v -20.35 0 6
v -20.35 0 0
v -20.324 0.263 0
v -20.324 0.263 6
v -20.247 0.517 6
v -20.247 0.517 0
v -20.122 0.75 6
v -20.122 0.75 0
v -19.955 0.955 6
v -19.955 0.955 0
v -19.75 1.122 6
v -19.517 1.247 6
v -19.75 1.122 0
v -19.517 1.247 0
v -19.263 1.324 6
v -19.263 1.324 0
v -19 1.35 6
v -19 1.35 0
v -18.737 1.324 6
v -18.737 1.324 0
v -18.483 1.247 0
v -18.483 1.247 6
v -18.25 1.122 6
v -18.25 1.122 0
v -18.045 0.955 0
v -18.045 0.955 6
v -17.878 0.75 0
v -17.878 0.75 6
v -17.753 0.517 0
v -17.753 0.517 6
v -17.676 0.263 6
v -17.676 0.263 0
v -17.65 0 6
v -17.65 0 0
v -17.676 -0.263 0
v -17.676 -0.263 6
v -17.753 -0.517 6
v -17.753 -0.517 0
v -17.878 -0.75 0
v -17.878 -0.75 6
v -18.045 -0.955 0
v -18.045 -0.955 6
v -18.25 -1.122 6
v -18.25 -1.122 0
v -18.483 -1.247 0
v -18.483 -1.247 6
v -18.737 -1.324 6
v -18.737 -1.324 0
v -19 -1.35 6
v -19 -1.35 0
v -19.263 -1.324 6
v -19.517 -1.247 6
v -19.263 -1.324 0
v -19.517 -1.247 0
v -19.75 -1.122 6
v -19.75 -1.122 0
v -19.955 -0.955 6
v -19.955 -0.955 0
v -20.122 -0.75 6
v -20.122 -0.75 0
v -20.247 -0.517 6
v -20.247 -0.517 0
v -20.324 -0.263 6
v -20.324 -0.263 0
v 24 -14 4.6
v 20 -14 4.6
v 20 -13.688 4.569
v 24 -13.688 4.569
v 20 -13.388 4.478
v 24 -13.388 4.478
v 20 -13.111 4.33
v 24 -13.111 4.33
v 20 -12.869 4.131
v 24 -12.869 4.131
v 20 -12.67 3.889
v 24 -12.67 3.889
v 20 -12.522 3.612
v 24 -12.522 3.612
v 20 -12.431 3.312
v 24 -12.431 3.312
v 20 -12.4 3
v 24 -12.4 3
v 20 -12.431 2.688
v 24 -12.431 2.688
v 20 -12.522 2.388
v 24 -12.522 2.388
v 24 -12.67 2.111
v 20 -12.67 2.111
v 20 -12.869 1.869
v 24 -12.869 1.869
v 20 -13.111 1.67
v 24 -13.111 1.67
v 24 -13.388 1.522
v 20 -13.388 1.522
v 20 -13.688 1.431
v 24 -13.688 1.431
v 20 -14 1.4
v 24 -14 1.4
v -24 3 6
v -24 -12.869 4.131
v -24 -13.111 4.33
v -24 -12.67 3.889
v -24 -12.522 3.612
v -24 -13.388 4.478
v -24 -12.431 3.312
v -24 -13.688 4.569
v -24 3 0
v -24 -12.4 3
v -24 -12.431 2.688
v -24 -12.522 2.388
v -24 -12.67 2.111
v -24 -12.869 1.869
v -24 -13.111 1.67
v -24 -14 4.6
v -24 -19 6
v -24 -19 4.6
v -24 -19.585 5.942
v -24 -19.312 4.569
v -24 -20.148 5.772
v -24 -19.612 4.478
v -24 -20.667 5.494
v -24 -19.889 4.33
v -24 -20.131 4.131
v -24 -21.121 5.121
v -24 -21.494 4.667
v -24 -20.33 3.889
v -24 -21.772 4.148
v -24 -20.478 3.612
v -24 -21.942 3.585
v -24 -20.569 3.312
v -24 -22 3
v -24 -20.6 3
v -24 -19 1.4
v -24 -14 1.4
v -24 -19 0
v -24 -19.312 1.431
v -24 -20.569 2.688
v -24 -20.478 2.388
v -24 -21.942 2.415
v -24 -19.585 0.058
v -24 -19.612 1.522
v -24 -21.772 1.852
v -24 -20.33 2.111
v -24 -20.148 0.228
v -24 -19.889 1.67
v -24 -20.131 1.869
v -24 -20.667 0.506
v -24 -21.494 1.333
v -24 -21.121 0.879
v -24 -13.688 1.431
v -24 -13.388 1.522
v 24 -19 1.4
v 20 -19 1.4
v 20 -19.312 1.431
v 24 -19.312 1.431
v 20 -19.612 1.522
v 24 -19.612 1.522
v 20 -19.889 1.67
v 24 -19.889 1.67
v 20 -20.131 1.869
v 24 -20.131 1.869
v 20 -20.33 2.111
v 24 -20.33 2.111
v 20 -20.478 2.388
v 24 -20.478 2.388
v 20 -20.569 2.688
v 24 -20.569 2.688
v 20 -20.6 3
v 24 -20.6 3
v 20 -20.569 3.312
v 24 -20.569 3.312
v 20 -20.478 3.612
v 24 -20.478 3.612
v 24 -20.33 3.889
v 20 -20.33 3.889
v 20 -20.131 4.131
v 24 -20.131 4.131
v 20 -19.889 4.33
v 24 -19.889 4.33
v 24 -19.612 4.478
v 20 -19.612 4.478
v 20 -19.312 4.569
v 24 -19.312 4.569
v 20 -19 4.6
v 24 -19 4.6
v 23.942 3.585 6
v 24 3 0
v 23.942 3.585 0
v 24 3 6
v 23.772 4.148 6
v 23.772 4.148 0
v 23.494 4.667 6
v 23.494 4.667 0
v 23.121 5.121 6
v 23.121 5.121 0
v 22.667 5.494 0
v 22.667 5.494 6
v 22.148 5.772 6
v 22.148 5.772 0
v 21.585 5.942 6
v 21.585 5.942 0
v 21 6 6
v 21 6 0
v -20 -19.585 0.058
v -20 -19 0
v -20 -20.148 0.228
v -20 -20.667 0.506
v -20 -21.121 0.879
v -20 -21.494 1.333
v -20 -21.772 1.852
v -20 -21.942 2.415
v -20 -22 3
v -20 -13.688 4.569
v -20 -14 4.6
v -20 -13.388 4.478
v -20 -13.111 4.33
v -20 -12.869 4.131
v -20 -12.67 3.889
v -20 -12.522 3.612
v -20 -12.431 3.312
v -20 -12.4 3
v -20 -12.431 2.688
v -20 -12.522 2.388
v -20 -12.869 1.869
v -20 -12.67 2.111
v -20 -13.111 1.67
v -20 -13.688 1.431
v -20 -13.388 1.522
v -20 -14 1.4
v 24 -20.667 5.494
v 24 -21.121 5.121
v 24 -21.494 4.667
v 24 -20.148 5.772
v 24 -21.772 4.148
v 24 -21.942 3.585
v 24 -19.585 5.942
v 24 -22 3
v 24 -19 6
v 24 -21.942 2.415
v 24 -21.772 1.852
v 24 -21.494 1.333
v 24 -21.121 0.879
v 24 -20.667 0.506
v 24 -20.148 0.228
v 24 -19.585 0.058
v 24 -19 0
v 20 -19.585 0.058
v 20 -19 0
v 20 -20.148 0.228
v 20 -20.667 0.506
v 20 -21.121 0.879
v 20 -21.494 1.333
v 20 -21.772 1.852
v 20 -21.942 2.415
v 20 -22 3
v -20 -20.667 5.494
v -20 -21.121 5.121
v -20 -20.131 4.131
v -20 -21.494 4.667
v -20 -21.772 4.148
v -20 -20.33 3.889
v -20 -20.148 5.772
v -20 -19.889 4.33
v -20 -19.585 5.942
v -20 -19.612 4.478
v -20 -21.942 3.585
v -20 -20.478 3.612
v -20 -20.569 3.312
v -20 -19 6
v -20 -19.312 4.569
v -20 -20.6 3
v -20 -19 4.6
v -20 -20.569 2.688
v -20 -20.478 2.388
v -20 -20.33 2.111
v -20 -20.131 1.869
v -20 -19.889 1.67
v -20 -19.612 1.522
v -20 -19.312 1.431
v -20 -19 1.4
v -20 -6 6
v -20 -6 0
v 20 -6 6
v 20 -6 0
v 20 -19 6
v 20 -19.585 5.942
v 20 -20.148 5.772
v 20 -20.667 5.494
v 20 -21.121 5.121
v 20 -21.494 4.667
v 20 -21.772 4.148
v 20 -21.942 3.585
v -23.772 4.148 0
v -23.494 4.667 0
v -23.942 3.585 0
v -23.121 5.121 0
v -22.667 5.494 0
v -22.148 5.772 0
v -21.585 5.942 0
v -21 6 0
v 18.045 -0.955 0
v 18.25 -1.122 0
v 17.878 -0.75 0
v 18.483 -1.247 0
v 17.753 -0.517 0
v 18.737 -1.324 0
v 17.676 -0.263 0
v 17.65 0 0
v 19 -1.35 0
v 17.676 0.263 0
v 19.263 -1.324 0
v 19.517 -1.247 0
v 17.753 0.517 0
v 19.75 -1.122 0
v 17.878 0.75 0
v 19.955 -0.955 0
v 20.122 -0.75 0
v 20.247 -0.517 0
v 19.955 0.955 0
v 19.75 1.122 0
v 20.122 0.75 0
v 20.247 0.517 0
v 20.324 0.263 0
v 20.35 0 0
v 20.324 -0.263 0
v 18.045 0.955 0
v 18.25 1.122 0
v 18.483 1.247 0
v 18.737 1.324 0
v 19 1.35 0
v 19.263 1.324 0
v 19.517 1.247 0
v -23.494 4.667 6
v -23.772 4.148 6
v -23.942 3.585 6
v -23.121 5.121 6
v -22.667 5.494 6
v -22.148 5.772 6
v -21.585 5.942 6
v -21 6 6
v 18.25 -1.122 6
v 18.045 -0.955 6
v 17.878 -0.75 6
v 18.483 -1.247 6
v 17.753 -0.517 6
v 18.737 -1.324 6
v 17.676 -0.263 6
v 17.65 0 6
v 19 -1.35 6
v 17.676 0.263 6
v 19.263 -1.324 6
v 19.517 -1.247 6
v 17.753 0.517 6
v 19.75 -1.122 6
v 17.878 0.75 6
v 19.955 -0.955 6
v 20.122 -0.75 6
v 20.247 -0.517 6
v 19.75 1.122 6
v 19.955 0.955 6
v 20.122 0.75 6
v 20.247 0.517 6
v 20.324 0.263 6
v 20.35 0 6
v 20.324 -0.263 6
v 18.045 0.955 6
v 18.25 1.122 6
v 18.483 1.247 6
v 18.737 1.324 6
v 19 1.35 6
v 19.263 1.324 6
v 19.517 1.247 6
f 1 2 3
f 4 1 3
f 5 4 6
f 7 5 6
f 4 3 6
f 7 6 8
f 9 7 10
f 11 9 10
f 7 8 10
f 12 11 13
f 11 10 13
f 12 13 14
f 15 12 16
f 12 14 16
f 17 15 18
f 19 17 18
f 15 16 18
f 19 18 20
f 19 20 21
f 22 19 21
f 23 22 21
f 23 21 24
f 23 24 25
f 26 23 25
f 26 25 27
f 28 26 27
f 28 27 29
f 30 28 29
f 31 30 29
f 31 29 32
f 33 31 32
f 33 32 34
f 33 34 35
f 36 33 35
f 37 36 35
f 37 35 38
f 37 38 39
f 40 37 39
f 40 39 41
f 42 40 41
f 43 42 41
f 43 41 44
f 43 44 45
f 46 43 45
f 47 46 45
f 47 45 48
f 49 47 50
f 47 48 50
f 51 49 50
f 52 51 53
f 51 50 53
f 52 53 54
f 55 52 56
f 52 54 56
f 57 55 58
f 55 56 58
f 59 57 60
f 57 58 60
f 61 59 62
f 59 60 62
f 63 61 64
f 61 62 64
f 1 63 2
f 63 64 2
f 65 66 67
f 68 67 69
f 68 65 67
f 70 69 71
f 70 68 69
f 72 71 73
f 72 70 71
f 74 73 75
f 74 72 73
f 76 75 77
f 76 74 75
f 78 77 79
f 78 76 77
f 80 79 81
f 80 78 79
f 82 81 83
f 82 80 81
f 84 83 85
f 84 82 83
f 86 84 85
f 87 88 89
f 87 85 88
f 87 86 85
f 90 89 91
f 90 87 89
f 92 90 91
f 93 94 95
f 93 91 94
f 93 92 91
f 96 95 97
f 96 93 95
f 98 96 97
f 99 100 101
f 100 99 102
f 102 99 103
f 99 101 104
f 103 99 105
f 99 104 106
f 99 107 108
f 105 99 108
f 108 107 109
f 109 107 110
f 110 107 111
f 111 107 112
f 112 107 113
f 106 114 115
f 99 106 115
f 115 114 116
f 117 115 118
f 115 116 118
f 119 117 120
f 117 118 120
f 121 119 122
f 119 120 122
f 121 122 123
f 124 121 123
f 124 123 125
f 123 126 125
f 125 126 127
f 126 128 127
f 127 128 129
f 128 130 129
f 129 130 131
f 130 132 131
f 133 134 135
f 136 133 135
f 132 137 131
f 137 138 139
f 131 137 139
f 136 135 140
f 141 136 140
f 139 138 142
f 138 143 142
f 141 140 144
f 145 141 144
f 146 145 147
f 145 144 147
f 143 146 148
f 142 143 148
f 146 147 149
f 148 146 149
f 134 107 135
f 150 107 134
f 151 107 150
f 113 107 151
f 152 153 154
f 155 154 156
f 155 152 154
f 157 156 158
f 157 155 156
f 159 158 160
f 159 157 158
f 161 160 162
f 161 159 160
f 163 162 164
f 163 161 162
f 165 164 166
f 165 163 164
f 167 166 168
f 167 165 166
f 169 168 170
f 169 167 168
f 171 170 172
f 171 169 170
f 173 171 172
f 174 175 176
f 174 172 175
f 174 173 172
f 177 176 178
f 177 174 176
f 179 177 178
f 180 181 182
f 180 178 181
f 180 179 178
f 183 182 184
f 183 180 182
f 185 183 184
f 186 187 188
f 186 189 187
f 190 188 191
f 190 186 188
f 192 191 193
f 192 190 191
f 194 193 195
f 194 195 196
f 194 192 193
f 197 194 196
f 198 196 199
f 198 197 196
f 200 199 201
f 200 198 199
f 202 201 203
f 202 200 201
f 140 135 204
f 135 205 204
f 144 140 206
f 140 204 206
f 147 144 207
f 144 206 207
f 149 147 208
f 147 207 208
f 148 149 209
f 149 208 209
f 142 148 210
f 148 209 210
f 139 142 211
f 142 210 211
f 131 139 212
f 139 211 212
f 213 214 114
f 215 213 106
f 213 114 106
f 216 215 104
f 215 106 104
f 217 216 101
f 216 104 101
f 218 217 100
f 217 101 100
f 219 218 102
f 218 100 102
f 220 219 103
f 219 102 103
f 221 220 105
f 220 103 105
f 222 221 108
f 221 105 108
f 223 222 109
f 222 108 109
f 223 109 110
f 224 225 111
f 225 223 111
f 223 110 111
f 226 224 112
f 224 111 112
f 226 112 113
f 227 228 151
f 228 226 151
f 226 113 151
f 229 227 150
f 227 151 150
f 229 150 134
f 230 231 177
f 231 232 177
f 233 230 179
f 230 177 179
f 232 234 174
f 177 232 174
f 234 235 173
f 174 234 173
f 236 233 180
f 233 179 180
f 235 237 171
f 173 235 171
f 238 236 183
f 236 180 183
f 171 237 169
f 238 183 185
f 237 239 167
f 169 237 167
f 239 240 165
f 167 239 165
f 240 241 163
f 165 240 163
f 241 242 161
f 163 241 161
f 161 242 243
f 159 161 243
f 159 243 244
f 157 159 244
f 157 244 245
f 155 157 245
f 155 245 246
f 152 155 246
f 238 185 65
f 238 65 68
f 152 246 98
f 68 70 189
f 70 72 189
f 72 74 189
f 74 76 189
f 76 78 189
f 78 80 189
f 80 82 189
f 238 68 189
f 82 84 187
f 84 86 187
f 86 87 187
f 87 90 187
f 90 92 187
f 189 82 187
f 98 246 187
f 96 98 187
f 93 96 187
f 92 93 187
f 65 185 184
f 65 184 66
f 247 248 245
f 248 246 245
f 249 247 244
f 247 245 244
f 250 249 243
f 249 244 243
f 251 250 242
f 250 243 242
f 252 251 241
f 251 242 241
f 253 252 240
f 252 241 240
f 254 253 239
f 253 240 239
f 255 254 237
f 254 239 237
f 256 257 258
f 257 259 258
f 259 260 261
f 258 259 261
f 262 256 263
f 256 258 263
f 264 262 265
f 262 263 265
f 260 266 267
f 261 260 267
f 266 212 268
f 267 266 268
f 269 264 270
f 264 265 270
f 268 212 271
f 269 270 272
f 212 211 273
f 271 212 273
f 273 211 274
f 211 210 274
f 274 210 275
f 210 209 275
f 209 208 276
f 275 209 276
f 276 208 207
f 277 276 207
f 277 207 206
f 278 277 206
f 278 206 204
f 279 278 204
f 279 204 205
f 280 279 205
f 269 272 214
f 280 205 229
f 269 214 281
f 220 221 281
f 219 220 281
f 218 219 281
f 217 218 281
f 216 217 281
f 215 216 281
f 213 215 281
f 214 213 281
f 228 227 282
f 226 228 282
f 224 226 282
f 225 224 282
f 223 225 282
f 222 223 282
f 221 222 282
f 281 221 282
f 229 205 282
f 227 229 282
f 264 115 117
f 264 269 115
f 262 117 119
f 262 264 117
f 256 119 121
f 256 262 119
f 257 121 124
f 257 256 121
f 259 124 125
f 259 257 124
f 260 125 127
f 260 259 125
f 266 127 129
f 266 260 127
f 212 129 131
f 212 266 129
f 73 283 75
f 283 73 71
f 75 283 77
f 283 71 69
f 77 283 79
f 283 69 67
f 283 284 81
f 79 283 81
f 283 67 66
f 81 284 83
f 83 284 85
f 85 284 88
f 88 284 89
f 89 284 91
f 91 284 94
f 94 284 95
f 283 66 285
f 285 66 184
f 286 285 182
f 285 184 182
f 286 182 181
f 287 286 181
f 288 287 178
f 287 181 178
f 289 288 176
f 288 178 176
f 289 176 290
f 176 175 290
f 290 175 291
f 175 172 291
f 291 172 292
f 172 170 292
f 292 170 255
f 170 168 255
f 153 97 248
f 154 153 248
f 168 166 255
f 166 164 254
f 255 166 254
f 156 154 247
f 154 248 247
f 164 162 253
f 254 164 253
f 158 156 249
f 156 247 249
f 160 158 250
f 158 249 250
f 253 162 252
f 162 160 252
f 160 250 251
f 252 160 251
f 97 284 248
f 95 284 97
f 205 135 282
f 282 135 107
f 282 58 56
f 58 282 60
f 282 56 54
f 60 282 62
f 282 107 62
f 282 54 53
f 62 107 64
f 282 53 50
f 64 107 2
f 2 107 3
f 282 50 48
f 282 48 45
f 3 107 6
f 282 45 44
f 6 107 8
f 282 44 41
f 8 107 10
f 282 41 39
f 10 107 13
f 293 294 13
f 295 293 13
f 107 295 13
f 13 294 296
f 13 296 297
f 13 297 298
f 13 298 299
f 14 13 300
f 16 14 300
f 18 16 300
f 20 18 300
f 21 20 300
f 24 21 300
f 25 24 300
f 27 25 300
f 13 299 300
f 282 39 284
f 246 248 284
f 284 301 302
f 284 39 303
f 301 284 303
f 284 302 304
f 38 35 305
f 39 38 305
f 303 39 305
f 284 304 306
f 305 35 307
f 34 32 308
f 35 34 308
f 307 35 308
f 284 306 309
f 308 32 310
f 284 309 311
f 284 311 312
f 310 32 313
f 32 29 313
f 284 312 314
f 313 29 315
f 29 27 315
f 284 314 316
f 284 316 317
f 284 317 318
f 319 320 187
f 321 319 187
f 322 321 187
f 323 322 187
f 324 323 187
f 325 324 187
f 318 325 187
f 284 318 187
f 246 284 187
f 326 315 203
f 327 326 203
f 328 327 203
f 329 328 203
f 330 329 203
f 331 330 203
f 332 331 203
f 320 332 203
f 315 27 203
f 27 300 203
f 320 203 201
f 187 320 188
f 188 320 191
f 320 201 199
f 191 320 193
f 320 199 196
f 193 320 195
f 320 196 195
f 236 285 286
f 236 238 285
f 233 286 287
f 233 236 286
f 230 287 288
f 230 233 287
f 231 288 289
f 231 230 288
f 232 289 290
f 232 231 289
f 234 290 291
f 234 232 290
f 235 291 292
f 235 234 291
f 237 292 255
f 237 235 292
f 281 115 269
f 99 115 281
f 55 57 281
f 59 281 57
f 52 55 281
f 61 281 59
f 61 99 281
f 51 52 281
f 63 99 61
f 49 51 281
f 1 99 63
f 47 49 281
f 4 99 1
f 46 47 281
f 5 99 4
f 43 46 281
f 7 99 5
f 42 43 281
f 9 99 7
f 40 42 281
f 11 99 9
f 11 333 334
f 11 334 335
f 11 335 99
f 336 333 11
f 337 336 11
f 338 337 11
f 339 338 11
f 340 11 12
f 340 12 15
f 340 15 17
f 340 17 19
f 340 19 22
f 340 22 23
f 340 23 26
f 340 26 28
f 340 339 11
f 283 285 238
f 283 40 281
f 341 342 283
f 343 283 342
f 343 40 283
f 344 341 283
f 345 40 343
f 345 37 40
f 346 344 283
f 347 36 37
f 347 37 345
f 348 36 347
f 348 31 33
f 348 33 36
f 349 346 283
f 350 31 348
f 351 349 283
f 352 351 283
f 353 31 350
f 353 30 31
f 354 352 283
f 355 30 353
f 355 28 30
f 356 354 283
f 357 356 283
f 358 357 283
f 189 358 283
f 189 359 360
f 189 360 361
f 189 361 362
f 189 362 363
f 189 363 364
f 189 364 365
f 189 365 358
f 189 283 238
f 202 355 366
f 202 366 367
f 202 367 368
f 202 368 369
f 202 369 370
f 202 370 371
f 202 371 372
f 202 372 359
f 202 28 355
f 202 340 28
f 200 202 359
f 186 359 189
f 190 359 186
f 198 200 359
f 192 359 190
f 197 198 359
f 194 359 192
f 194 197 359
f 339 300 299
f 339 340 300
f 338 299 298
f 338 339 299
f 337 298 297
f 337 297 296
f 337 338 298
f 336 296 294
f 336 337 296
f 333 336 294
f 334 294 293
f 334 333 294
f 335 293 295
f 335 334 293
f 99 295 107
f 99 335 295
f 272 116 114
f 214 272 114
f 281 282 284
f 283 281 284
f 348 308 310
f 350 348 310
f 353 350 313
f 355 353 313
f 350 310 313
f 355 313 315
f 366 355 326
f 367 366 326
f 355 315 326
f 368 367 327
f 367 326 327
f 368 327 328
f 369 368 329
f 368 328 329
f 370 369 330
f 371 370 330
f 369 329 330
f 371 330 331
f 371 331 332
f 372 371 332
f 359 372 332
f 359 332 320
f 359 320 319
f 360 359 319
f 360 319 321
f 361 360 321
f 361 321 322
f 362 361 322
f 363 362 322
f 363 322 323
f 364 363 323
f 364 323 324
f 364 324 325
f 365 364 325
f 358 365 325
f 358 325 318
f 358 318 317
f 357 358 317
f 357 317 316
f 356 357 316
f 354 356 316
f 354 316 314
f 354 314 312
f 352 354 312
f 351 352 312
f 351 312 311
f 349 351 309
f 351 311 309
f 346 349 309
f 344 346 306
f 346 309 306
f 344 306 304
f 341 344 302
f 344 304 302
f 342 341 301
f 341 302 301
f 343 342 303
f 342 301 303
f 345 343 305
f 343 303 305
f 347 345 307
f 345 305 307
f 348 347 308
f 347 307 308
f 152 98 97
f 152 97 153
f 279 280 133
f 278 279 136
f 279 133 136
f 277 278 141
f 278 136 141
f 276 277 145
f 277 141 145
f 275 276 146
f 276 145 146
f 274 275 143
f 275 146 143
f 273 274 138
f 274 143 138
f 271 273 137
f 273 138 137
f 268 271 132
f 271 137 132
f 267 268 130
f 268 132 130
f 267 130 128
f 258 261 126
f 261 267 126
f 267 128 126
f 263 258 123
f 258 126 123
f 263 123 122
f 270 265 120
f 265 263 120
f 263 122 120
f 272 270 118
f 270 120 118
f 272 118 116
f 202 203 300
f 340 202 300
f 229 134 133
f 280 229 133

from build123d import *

# Parameters (mm, degrees)
EXTRUDE_1_DEPTH     = 6
CUT_EXTRUDE_1_REACH = 55.141
FILLET_1_R          = 3
SKETCH_3_R          = 1.35
CUT_EXTRUDE_2_DEPTH = 34.105890714


with BuildPart() as part:
    # 草圖1 → 填料-伸長1 (new body)
    with BuildSketch(Plane.XY):
        Polygon((-20, -6), (20, -6), (20, -22), (24, -22), (24, -6), (24, 6), (-24, 6), (-24, -6), (-24, -22), (-20, -22), align=None)
    extrude(amount=EXTRUDE_1_DEPTH)

    # 草圖2 → 除料-伸長1 (cut, up to next)
    with BuildSketch(Plane(origin=(24, 0, 0), x_dir=(0, 0, -1), z_dir=(1, 0, 0)), mode=Mode.PRIVATE) as cut_extrude_1_sk1:
        with BuildLine():
            Line((-1.4, -14), (-1.4, -19))
            ThreePointArc((-1.4, -19), (-3, -20.6), (-4.6, -19))
            Line((-4.6, -19), (-4.6, -14))
            ThreePointArc((-4.6, -14), (-3, -12.4), (-1.4, -14))
        make_face()
    cut_extrude_1_tool1 = extrude(cut_extrude_1_sk1.sketch, amount=-CUT_EXTRUDE_1_REACH, mode=Mode.PRIVATE) & part.part
    cut_extrude_1 = cut_extrude_1_tool1.solids().sort_by_distance((24, -16.5, 3))[0]
    add(cut_extrude_1, mode=Mode.SUBTRACT)

    # 鏡射1: 除料-伸長1 across plane
    add(cut_extrude_1.mirror(Plane(origin=(0, 0, 0), x_dir=(0, 0, 1), z_dir=(1, 0, 0))), mode=Mode.SUBTRACT)

    # 圓角1
    fillet_1_edges = [part.edges().sort_by_distance(p)[0] for p in [
        (-24, 6, 3),
        (24, 6, 3),
        (-22, -22, 6),
        (-22, -22, 0),
        (22, -22, 0),
        (22, -22, 6),
    ]]
    fillet(fillet_1_edges, radius=FILLET_1_R - 0.0001)  # a hair under: the kernel refuses the full size

    # 草圖3 → 除料-伸長2 (cut, through all)
    with BuildSketch(Plane(origin=(0, 0, 0), x_dir=(-1, 0, 0), z_dir=(0, 0, -1))):
        with Locations((19, 0)):
            Circle(SKETCH_3_R)
        with Locations((-19, 0)):
            Circle(SKETCH_3_R)
    extrude(amount=-CUT_EXTRUDE_2_DEPTH, mode=Mode.SUBTRACT)


solid = part.part
